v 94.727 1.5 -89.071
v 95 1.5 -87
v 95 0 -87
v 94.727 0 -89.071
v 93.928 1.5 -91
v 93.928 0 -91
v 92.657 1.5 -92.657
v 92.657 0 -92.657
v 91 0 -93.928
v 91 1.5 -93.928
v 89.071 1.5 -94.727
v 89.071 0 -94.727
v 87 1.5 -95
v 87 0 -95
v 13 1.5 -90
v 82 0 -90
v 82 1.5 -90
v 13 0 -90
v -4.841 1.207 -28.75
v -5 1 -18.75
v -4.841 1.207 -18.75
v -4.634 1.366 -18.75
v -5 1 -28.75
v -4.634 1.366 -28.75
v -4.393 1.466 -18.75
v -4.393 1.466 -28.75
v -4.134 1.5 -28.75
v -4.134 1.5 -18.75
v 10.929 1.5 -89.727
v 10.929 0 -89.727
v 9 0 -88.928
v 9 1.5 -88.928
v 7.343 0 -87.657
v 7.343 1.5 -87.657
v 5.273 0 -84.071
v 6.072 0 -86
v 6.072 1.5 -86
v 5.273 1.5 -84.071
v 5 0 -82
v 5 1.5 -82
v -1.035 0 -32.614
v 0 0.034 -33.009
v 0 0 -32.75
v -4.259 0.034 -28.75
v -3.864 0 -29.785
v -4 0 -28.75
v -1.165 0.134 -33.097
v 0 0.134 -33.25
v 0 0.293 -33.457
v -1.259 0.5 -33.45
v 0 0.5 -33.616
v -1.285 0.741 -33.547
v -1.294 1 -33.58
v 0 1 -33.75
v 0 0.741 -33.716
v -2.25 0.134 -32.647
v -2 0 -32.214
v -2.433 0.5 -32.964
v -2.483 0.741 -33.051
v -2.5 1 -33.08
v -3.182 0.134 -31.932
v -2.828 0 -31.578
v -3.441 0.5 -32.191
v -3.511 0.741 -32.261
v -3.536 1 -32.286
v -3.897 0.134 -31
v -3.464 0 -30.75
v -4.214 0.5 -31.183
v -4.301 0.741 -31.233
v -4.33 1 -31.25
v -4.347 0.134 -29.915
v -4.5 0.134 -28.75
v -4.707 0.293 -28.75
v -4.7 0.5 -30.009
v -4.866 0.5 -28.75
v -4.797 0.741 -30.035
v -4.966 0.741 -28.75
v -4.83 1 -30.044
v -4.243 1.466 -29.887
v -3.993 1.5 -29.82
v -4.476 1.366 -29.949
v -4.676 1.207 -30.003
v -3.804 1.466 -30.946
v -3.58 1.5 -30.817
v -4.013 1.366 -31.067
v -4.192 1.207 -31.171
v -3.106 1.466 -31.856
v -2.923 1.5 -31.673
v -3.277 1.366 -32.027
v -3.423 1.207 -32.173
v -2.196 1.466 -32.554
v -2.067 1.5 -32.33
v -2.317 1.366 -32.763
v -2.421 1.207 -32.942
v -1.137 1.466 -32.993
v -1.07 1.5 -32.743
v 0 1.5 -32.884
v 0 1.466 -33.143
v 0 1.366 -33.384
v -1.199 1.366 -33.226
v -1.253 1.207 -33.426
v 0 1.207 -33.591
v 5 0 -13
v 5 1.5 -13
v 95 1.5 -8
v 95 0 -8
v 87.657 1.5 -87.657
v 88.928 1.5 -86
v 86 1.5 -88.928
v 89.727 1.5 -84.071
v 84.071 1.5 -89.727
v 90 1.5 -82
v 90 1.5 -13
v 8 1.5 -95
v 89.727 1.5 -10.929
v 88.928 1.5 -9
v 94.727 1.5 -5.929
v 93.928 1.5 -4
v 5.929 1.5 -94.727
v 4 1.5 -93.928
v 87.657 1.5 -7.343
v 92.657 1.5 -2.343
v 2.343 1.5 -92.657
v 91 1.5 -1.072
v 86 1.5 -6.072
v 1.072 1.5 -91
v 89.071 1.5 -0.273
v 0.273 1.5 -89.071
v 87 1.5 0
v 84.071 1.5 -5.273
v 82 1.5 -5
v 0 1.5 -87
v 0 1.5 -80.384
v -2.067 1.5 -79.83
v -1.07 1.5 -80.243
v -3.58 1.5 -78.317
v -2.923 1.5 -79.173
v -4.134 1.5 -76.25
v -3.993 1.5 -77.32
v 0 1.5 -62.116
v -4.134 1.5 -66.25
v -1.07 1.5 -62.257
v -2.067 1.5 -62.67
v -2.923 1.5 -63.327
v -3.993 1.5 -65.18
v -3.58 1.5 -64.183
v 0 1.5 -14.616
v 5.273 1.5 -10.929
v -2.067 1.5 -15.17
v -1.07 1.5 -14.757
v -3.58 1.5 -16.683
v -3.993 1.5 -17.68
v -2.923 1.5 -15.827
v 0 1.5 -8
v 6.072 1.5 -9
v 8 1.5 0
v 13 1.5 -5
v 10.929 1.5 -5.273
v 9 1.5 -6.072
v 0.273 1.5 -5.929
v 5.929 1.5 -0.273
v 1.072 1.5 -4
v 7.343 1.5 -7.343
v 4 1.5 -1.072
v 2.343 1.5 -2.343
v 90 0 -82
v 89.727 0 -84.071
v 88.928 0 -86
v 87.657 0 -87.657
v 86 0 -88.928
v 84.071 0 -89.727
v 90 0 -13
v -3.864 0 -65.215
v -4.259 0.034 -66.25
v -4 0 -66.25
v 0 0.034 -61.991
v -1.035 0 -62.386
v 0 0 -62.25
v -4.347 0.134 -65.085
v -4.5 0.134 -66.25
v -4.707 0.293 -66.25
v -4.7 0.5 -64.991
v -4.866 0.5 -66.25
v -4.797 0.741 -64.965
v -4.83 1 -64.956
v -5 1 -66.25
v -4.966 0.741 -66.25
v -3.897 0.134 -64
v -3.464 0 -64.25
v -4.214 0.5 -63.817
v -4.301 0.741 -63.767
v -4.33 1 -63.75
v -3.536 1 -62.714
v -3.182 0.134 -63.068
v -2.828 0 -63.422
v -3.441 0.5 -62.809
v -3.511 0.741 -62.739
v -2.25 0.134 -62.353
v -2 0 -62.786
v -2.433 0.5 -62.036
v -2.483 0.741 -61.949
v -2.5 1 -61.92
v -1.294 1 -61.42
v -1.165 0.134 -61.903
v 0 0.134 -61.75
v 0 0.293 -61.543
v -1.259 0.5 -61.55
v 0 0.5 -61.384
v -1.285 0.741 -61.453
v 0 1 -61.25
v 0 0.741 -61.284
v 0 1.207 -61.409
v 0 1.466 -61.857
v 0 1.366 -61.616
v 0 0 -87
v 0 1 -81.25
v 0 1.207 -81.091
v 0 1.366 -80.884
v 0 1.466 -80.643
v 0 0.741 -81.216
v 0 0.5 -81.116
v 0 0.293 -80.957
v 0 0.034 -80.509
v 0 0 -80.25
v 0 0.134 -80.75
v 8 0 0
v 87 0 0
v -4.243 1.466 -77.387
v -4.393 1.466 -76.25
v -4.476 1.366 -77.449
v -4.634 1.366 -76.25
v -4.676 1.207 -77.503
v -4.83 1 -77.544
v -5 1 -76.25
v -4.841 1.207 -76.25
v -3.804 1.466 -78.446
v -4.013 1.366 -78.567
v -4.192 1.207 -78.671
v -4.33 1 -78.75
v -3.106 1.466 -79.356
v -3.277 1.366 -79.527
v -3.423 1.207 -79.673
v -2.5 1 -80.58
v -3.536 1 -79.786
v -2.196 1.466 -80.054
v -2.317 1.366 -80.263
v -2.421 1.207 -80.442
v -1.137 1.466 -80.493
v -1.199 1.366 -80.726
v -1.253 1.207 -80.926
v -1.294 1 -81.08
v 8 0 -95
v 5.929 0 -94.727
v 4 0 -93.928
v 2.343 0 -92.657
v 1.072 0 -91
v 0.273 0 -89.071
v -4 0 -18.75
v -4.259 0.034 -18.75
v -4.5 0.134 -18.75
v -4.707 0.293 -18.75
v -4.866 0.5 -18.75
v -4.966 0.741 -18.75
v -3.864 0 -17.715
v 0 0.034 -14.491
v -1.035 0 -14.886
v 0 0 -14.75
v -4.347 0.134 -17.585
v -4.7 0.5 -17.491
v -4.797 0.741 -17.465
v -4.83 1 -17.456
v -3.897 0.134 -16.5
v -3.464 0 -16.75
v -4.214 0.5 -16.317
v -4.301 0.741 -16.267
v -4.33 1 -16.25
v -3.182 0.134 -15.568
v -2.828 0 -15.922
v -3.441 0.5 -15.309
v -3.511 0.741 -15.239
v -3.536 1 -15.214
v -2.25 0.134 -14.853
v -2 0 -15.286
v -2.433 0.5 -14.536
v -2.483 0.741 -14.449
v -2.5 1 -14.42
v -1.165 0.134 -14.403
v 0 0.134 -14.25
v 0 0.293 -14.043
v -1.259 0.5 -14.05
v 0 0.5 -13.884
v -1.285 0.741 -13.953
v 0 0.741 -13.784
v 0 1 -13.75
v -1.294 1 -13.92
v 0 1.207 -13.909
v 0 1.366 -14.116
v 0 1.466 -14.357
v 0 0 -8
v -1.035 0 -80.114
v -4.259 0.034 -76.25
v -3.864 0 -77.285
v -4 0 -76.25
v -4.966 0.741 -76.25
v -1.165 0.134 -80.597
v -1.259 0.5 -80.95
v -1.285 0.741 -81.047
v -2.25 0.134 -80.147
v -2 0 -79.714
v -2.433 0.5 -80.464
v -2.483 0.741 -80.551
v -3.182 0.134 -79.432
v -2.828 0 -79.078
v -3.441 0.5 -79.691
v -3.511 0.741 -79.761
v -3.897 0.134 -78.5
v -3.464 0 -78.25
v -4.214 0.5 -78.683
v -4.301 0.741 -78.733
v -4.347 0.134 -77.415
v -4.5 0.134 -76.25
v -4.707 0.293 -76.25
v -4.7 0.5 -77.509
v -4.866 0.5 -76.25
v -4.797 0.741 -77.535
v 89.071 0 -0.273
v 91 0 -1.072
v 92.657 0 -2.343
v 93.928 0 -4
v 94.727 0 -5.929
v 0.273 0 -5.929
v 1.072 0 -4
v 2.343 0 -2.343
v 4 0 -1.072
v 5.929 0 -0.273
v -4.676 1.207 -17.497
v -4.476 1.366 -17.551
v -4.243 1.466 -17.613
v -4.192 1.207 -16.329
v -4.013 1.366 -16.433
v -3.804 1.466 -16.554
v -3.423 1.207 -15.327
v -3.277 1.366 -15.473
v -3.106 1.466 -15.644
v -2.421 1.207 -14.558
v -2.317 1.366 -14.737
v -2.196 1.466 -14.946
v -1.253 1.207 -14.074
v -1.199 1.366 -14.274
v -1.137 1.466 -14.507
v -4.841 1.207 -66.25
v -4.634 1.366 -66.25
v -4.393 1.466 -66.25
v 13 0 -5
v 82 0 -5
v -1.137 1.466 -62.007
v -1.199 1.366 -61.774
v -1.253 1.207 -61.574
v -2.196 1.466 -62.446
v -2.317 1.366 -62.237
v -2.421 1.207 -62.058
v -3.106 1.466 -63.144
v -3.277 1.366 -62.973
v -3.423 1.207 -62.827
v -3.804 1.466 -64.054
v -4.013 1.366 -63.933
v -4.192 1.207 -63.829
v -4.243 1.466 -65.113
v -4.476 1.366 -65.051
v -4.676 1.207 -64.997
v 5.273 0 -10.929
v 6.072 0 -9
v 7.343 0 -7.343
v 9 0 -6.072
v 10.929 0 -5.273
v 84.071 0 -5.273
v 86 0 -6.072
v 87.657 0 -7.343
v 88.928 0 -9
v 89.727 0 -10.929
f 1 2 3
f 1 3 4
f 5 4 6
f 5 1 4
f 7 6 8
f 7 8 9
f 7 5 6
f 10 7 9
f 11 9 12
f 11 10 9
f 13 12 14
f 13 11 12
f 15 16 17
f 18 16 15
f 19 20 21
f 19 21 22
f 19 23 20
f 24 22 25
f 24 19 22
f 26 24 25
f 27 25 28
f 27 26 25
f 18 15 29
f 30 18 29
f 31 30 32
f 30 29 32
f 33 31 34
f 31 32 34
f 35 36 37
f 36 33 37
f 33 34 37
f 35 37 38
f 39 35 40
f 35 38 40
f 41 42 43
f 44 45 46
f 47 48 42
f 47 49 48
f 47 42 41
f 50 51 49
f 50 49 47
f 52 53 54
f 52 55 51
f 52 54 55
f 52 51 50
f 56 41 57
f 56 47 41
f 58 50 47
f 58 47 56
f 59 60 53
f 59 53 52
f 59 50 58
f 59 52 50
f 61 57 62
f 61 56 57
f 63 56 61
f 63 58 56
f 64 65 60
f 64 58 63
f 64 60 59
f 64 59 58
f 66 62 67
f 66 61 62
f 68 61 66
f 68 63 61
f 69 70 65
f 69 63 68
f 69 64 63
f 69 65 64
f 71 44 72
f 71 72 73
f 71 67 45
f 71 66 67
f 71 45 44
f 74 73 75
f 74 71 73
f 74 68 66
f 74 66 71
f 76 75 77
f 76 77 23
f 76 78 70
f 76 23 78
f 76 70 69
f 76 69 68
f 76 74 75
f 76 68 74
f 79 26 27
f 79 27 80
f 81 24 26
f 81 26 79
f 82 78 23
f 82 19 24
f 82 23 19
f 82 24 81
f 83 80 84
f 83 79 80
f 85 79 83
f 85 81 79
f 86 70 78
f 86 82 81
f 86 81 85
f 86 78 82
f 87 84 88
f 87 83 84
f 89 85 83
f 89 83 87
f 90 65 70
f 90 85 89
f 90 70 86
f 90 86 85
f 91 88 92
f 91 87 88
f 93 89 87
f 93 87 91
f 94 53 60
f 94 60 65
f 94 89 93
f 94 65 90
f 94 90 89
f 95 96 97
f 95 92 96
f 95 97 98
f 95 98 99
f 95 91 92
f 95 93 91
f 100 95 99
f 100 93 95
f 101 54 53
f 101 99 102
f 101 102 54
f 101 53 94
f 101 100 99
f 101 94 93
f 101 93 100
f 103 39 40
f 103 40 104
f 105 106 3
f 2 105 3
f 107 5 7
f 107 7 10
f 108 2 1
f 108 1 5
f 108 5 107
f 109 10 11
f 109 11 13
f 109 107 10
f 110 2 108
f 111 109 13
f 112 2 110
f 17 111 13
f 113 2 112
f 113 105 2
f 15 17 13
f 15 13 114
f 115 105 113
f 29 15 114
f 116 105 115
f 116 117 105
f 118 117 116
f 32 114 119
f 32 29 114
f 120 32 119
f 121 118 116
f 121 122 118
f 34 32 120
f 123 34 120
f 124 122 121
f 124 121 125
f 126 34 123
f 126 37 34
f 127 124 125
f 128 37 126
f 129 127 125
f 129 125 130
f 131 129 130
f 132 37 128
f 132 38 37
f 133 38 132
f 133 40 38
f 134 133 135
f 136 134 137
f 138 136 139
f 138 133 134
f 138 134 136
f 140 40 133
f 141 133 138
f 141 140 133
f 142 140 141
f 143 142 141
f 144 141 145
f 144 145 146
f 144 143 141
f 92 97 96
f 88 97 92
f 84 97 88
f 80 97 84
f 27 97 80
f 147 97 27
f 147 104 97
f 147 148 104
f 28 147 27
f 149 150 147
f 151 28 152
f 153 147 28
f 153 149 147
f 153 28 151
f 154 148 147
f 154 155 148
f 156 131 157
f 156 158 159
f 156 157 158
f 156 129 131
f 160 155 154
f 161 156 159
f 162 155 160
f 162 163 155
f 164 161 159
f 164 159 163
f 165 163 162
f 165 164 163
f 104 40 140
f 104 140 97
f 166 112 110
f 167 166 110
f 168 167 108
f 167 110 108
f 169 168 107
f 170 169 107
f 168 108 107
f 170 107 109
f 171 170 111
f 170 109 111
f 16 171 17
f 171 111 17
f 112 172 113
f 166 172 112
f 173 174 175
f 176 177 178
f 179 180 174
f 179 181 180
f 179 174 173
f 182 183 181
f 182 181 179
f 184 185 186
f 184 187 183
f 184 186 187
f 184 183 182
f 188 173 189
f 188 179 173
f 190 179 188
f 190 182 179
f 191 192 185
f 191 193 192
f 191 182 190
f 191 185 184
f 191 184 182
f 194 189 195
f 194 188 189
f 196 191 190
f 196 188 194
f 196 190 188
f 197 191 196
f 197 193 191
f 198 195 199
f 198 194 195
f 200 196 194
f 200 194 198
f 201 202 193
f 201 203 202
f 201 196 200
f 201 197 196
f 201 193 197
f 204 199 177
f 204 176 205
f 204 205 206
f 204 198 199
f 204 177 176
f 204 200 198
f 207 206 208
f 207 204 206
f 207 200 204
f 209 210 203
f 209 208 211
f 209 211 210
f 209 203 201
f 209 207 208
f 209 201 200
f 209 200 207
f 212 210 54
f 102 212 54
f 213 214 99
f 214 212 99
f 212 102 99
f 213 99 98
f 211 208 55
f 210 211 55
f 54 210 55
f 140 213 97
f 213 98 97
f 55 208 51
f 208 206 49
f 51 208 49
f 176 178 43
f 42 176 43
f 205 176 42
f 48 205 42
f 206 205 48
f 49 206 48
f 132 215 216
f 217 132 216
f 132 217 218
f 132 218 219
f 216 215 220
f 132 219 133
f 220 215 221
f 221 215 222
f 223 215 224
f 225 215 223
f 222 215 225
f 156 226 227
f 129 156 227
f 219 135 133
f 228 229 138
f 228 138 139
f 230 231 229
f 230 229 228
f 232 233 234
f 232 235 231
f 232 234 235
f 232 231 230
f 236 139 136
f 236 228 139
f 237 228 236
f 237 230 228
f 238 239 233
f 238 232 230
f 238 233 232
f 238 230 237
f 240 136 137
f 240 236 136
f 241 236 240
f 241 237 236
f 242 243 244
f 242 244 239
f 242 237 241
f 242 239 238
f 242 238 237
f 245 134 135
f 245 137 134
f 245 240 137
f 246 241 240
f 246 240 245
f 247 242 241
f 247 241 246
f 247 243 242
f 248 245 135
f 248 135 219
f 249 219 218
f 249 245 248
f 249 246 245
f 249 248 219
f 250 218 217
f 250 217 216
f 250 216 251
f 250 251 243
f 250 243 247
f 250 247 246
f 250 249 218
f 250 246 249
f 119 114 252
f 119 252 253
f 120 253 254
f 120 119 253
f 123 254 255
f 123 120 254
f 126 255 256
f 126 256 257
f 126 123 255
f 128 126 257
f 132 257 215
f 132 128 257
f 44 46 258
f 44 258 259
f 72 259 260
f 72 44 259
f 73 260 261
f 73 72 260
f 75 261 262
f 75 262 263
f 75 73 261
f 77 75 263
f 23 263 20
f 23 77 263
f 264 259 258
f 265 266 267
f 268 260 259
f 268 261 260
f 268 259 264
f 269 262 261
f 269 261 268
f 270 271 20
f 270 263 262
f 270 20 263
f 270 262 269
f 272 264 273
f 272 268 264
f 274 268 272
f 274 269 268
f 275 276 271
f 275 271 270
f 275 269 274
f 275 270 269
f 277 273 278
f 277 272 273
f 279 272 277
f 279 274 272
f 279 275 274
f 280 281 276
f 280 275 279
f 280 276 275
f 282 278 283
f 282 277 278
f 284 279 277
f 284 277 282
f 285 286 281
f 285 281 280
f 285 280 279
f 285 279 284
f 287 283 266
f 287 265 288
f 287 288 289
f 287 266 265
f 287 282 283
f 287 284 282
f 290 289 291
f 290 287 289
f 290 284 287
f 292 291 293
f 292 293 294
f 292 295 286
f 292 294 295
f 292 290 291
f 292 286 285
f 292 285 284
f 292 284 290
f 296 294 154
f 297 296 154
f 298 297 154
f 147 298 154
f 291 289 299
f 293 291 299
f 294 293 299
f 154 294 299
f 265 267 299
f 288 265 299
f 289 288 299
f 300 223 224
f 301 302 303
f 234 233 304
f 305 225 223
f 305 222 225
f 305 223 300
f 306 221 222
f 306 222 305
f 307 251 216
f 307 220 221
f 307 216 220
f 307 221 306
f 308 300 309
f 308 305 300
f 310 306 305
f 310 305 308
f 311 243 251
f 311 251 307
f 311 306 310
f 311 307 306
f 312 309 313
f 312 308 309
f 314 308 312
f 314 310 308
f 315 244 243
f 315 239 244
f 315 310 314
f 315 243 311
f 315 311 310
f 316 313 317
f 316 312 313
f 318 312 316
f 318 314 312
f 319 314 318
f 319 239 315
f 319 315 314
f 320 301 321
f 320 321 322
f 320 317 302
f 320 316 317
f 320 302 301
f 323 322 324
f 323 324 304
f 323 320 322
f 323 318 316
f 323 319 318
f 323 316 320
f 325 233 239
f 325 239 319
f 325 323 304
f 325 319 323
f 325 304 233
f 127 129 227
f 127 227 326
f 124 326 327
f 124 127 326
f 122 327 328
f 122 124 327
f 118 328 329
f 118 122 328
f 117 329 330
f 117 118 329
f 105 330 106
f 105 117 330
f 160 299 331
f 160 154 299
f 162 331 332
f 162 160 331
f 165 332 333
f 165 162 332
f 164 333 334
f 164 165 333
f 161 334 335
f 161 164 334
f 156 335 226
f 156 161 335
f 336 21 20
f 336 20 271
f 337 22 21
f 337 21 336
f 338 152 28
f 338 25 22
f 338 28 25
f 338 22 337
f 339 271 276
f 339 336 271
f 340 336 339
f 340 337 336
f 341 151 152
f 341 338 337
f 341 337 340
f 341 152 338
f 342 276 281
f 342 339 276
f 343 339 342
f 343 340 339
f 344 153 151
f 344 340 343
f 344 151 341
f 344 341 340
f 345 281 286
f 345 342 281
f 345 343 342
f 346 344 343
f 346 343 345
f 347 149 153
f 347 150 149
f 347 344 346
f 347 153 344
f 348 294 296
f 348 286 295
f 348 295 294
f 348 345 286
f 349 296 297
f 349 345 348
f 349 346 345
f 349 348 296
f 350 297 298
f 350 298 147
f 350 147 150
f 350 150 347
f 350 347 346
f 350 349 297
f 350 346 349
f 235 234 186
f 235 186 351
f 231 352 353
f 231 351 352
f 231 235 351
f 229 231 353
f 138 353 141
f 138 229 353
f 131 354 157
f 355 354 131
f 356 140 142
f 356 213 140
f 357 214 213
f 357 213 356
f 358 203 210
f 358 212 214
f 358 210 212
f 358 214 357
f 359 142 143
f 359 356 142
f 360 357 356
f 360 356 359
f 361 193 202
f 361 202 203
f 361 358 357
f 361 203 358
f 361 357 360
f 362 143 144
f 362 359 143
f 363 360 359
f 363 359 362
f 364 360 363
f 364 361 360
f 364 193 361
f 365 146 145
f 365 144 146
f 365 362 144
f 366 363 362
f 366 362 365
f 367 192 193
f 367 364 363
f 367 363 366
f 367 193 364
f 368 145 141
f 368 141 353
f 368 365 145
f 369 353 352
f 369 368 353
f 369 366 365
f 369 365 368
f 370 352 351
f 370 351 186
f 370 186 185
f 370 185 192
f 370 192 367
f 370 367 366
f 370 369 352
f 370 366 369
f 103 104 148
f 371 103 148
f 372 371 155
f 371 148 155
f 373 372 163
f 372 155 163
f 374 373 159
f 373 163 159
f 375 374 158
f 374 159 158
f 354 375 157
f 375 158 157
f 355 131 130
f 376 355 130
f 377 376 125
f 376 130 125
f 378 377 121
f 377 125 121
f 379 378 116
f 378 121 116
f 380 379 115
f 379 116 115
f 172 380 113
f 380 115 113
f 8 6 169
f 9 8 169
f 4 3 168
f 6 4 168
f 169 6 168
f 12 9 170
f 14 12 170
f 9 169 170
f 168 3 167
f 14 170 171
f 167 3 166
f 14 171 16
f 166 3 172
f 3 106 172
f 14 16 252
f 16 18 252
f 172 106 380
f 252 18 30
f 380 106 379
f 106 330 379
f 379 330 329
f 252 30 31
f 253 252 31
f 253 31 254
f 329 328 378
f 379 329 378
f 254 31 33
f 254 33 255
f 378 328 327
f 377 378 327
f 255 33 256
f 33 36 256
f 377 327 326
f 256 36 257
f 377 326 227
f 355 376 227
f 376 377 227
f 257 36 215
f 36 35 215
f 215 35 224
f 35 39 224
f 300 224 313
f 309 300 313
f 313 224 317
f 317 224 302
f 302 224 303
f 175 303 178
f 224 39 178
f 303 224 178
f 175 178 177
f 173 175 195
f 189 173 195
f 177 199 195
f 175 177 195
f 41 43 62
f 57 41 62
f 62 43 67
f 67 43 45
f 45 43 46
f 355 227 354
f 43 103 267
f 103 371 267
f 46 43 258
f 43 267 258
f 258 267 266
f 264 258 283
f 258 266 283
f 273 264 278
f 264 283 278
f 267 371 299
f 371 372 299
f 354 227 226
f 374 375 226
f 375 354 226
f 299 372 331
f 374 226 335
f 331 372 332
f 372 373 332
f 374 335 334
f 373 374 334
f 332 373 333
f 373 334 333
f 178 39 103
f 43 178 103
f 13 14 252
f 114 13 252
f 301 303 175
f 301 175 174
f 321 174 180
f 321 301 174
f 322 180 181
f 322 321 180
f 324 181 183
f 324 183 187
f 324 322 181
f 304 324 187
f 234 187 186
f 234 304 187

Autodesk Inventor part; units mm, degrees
ref_plane "YZ Plane" through (0, 0, 0) normal (1, 0, 0) x (0, 1, 0)
ref_plane "XZ Plane" through (0, 0, 0) normal (0, 1, 0) x (-1, 0, 0)
ref_plane "XY Plane" through (0, 0, 0) normal (0, 0, 1) x (1, 0, 0)
sketch "Sketch1" plane through (0, 0, 0) normal (0, 1, 0) x (-1, 0, 0)
  line L0 (0, 0) -> (-95, 0)
  line L1 (-95, 0) -> (-95, -95)
  line L2 (-95, -95) -> (0, -95)
  line L3 (0, -95) -> (0, 0)
  line L4 (0, 0) -> (-5, 0)
  line L5 (-5, 0) -> (-5, -5)
  line L6 (-5, -5) -> (0, -5)
  line L7 (0, -5) -> (0, 0)
  line L8 (-95, -95) -> (-90, -95)
  line L9 (-90, -95) -> (-90, -90)
  line L10 (-90, -90) -> (-95, -90)
  line L11 (-95, -90) -> (-95, -95)
  line L12 (-90, -90) -> (-5, -90)
  line L13 (-5, -90) -> (-5, -5)
  line L14 (-5, -5) -> (-90, -5)
  line L15 (-90, -5) -> (-90, -90)
  line L16 (0, -47.5) -> (0, 0)
  line L17 (0, -47.5) -> (0, -95)
  line L18 (0, -23.75) -> (0, -18.75)
  line L19 (0, -18.75) -> (0, -28.75)
  line L20 (0, -71.25) -> (0, -76.25)
  line L21 (0, -76.25) -> (0, -66.25)
  line L22 (0, -18.75) -> (0, -28.75) construction
  line L23 (-5, -18.75) -> (-5, -28.75)
  line L24 (5, -28.75) -> (5, -18.75)
  arc A0 (5, -18.75) -> (-5, -18.75) centre (0, -18.75) ccw
  arc A1 (-5, -28.75) -> (5, -28.75) centre (0, -28.75) ccw
  line L25 (0, -66.25) -> (0, -76.25) construction
  line L26 (-5, -66.25) -> (-5, -76.25)
  line L27 (5, -76.25) -> (5, -66.25)
  arc A2 (5, -66.25) -> (-5, -66.25) centre (0, -66.25) ccw
  arc A3 (-5, -76.25) -> (5, -76.25) centre (0, -76.25) ccw
  point P0 (0, -61.25)
  point P1 (0, -81.25)
  point P2 (0, -13.75)
  point P3 (0, -33.75)
  dimension "d0" = 95
  dimension "d1" = 95
  dimension "d2" = 5
  dimension "d3" = 5
  dimension "d4" = 5
  dimension "d5" = 5
  dimension "d8" = 5
  dimension "d9" = 10
  dimension "d10" = 5
  dimension "d11" = 10
  dimension "d12" = 10
  dimension "d13" = 10
extrude "Extrusion1" add sketch "Sketch1" along normal blind 1.5 contours L3 L6 L5 L0 | L5 L14 L15 L10 L1 L0 | L3 A0 L13 L6 | A0 L24 A1 L3 | L3 A1 L13 A0 | L10 L9 L2 L1 | L12 L13 A3 L3 L2 L9 | A1 L3 A2 L13 | A2 L3 A3 L13 | A2 L27 A3 L3
fillet "Fillet1" radius 8 8 edges at (5, 0.75, -5) (0, 0.75, 0) (0, 0.75, -95) (5, 0.75, -90) (95, 0.75, 0) (90, 0.75, -5) (95, 0.75, -95) (90, 0.75, -90)
fillet "Fillet2" radius 1 12 edges at (-3.5355, 0, -15.2145) (-3.5355, 0, -32.2855) (-5, 0, -23.75) (-3.5355, 1.5, -15.2145) (-3.5355, 1.5, -32.2855) (-5, 1.5, -23.75) (-3.5355, 0, -62.7145) (-3.5355, 0, -79.7855) (-5, 0, -71.25) (-3.5355, 1.5, -62.7145) (-3.5355, 1.5, -79.7855) (-5, 1.5, -71.25)
properties part number "Plate"
